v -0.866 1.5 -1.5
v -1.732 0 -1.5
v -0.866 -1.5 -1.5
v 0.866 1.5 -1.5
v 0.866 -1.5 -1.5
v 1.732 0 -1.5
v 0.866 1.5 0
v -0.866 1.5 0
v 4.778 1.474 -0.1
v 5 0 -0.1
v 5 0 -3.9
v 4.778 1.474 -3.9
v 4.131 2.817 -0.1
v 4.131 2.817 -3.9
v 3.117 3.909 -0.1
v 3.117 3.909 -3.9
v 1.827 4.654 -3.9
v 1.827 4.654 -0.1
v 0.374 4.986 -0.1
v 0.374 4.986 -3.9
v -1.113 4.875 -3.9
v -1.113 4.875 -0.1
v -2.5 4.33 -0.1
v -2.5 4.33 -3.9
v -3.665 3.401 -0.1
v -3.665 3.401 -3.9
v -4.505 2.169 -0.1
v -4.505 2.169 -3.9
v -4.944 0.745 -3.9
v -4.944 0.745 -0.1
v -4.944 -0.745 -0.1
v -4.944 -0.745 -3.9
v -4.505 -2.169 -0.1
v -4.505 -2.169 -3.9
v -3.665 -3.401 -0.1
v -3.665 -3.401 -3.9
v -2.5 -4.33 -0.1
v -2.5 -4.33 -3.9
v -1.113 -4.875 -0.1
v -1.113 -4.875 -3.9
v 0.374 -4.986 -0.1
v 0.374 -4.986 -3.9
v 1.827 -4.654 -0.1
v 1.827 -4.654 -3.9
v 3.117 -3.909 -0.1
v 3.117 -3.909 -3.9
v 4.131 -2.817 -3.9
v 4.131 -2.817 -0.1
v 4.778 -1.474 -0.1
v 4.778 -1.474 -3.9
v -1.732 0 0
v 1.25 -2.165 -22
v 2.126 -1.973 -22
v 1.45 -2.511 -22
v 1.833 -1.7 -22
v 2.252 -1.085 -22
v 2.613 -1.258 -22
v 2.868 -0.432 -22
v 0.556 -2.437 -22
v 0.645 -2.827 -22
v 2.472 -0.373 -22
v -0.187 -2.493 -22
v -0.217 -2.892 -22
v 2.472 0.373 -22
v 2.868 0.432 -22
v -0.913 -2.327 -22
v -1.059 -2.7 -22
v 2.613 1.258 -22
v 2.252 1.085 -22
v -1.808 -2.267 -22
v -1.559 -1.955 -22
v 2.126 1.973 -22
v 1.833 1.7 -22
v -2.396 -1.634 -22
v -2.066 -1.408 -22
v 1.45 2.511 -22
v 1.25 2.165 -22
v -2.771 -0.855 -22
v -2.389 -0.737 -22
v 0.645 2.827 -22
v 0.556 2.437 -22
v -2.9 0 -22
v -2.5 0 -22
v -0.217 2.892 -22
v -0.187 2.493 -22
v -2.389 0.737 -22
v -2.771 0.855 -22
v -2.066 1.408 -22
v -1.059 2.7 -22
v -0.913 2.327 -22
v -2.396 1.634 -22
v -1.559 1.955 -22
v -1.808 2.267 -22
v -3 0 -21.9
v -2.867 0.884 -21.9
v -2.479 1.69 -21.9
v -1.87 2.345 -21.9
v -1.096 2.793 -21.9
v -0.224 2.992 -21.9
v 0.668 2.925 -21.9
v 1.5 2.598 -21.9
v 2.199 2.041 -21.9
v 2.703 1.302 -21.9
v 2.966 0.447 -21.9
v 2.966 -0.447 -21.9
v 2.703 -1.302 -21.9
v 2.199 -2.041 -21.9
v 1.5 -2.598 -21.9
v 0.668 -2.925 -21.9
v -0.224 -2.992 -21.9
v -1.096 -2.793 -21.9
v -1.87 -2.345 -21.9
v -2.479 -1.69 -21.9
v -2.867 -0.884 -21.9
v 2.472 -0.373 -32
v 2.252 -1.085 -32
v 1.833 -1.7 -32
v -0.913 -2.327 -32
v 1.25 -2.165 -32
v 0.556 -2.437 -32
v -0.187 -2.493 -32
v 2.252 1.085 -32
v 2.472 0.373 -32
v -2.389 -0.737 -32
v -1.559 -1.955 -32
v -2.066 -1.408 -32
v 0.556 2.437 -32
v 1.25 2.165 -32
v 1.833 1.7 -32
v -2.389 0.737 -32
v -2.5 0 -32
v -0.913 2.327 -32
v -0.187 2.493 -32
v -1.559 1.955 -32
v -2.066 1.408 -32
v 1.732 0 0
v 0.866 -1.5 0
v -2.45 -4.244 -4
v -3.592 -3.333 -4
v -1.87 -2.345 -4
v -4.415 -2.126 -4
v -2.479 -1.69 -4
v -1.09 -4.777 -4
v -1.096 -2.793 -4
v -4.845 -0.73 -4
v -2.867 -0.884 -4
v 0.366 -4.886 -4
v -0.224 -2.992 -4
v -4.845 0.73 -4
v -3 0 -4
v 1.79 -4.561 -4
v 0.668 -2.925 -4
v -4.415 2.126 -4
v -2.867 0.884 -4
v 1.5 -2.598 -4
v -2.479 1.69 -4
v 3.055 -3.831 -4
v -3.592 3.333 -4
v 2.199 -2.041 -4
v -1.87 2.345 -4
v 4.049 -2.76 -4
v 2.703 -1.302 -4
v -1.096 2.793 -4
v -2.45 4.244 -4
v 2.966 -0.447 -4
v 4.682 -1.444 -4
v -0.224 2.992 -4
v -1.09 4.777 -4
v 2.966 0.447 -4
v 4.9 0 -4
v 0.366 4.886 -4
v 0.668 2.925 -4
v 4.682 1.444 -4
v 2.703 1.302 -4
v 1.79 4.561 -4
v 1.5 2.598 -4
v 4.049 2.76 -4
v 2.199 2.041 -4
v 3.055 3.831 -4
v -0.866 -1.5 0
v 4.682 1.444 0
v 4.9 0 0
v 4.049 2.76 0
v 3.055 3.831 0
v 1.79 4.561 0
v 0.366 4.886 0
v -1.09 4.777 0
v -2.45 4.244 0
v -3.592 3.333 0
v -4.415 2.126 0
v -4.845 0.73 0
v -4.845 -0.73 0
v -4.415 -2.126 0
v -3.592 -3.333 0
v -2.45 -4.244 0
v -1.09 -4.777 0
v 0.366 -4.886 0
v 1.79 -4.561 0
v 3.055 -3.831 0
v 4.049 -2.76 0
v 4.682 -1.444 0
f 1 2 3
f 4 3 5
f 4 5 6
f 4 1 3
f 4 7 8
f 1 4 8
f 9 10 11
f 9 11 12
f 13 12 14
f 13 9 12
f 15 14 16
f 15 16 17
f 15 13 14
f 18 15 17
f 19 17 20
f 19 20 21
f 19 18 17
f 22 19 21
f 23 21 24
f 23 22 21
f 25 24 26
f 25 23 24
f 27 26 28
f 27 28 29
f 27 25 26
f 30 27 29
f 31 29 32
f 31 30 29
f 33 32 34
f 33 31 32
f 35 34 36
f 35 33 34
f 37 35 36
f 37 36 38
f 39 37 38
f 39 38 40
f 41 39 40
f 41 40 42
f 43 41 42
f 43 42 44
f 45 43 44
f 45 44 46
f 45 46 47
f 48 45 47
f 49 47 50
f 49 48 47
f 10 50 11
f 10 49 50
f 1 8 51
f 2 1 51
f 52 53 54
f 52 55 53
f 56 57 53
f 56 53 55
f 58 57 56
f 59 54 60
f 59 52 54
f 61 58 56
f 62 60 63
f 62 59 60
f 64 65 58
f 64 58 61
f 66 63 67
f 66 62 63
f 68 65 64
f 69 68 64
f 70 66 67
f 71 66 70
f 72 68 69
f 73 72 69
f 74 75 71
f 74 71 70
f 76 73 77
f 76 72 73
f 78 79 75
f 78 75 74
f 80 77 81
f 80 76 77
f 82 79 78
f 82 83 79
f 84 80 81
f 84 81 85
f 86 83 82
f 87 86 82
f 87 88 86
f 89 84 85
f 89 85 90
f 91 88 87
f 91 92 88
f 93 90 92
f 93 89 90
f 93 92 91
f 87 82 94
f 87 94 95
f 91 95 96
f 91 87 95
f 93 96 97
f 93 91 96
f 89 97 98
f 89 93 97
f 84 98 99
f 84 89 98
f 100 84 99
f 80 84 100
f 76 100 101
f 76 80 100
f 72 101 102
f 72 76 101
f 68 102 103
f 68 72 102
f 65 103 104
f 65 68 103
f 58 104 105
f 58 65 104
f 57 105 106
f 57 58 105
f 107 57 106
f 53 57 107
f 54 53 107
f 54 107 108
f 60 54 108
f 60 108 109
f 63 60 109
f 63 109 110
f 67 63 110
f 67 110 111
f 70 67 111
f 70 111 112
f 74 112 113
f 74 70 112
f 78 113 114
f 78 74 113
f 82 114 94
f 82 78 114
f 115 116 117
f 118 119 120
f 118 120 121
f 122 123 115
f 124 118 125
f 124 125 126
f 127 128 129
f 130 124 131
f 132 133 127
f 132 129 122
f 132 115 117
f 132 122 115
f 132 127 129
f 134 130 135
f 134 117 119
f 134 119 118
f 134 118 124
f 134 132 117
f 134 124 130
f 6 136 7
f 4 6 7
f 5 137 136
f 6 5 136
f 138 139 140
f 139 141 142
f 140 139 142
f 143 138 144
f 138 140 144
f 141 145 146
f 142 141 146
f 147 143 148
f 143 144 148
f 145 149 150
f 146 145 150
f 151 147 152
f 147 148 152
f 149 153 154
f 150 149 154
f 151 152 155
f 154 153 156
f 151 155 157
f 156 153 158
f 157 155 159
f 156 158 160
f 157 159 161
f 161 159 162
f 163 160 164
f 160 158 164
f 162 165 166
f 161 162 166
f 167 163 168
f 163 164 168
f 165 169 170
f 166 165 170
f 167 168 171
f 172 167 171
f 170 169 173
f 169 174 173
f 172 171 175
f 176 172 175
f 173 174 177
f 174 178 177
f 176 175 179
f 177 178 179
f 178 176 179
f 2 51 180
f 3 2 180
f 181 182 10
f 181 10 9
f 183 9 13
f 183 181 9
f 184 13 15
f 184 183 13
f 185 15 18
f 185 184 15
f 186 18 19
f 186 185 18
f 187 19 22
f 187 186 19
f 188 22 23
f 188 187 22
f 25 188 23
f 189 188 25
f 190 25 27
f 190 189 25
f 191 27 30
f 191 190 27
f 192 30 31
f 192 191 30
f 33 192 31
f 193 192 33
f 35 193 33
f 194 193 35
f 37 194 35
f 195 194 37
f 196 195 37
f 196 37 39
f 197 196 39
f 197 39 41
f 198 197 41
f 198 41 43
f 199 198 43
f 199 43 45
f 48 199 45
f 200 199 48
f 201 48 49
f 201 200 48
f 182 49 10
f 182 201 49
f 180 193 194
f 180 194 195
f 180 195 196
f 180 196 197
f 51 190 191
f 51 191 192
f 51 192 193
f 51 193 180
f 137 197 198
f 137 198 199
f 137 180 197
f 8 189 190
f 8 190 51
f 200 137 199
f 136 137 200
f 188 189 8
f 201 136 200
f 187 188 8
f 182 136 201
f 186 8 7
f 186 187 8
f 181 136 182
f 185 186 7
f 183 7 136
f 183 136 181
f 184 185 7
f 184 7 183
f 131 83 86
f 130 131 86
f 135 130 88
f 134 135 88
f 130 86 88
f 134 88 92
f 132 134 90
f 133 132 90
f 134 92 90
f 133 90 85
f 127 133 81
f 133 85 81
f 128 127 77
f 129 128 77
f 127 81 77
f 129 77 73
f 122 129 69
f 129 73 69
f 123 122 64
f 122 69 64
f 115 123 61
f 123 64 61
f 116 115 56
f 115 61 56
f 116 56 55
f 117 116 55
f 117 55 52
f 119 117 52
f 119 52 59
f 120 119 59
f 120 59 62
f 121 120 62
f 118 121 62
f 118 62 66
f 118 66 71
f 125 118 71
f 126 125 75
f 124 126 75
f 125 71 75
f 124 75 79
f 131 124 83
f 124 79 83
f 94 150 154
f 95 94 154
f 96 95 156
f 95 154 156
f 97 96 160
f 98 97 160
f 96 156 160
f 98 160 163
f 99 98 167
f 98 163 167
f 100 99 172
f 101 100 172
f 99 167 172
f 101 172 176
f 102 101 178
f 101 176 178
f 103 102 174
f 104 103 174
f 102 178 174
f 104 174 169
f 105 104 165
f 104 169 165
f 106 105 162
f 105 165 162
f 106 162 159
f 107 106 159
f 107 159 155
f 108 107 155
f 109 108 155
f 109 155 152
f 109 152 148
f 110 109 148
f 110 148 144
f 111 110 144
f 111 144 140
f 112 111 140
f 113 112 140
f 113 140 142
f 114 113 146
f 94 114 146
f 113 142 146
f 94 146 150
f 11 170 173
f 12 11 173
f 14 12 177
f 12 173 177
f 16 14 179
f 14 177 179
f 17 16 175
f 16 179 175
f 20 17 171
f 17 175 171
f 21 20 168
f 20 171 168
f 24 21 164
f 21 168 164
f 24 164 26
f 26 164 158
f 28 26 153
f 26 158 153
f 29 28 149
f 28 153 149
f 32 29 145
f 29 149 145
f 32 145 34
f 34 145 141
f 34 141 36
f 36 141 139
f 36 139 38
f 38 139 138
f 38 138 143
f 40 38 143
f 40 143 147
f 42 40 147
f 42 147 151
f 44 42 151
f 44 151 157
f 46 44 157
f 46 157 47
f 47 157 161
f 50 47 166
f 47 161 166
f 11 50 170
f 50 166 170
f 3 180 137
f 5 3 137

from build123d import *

# Parameters (mm, degrees)
SKETCH_1_R          = 5
EXTRUDE_1_DEPTH     = 4
SKETCH_2_R          = 3
EXTRUDE_2_DEPTH     = 18
SKETCH_3_R          = 2.5
EXTRUDE_3_DEPTH     = 10
CHAMFER_1_SIZE      = 0.1
CUT_EXTRUDE_1_DEPTH = 1.5


with BuildPart() as part:
    # 草图1 → 凸台-拉伸1 (new body)
    with BuildSketch(Plane.XY):
        Circle(SKETCH_1_R)
    extrude(amount=-EXTRUDE_1_DEPTH)

    # 草图2 → 凸台-拉伸2 (add)
    with BuildSketch(Plane(origin=(0, 0, -4), x_dir=(-1, 0, 0), z_dir=(0, 0, -1))):
        Circle(SKETCH_2_R)
    extrude(amount=EXTRUDE_2_DEPTH)

    # 草图3 → 凸台-拉伸3 (add)
    with BuildSketch(Plane(origin=(0, 0, -22), x_dir=(-1, 0, 0), z_dir=(0, 0, -1))):
        Circle(SKETCH_3_R)
    extrude(amount=EXTRUDE_3_DEPTH)

    # 倒角1
    chamfer_1_edges = [part.edges().sort_by_distance(p)[0] for p in [
        (-5, 0, 0),
        (-5, 0, -4),
        (3, 0, -22),
    ]]
    chamfer(chamfer_1_edges, length=CHAMFER_1_SIZE)

    # 草图4 → 切除-拉伸1 (cut)
    with BuildSketch(Plane.XY):
        Polygon((1.732050808, 0), (0.866025404, 1.5), (-0.866025404, 1.5), (-1.732050808, 0), (-0.866025404, -1.5), (0.866025404, -1.5), align=None)
    extrude(amount=-CUT_EXTRUDE_1_DEPTH, mode=Mode.SUBTRACT)


solid = part.part
